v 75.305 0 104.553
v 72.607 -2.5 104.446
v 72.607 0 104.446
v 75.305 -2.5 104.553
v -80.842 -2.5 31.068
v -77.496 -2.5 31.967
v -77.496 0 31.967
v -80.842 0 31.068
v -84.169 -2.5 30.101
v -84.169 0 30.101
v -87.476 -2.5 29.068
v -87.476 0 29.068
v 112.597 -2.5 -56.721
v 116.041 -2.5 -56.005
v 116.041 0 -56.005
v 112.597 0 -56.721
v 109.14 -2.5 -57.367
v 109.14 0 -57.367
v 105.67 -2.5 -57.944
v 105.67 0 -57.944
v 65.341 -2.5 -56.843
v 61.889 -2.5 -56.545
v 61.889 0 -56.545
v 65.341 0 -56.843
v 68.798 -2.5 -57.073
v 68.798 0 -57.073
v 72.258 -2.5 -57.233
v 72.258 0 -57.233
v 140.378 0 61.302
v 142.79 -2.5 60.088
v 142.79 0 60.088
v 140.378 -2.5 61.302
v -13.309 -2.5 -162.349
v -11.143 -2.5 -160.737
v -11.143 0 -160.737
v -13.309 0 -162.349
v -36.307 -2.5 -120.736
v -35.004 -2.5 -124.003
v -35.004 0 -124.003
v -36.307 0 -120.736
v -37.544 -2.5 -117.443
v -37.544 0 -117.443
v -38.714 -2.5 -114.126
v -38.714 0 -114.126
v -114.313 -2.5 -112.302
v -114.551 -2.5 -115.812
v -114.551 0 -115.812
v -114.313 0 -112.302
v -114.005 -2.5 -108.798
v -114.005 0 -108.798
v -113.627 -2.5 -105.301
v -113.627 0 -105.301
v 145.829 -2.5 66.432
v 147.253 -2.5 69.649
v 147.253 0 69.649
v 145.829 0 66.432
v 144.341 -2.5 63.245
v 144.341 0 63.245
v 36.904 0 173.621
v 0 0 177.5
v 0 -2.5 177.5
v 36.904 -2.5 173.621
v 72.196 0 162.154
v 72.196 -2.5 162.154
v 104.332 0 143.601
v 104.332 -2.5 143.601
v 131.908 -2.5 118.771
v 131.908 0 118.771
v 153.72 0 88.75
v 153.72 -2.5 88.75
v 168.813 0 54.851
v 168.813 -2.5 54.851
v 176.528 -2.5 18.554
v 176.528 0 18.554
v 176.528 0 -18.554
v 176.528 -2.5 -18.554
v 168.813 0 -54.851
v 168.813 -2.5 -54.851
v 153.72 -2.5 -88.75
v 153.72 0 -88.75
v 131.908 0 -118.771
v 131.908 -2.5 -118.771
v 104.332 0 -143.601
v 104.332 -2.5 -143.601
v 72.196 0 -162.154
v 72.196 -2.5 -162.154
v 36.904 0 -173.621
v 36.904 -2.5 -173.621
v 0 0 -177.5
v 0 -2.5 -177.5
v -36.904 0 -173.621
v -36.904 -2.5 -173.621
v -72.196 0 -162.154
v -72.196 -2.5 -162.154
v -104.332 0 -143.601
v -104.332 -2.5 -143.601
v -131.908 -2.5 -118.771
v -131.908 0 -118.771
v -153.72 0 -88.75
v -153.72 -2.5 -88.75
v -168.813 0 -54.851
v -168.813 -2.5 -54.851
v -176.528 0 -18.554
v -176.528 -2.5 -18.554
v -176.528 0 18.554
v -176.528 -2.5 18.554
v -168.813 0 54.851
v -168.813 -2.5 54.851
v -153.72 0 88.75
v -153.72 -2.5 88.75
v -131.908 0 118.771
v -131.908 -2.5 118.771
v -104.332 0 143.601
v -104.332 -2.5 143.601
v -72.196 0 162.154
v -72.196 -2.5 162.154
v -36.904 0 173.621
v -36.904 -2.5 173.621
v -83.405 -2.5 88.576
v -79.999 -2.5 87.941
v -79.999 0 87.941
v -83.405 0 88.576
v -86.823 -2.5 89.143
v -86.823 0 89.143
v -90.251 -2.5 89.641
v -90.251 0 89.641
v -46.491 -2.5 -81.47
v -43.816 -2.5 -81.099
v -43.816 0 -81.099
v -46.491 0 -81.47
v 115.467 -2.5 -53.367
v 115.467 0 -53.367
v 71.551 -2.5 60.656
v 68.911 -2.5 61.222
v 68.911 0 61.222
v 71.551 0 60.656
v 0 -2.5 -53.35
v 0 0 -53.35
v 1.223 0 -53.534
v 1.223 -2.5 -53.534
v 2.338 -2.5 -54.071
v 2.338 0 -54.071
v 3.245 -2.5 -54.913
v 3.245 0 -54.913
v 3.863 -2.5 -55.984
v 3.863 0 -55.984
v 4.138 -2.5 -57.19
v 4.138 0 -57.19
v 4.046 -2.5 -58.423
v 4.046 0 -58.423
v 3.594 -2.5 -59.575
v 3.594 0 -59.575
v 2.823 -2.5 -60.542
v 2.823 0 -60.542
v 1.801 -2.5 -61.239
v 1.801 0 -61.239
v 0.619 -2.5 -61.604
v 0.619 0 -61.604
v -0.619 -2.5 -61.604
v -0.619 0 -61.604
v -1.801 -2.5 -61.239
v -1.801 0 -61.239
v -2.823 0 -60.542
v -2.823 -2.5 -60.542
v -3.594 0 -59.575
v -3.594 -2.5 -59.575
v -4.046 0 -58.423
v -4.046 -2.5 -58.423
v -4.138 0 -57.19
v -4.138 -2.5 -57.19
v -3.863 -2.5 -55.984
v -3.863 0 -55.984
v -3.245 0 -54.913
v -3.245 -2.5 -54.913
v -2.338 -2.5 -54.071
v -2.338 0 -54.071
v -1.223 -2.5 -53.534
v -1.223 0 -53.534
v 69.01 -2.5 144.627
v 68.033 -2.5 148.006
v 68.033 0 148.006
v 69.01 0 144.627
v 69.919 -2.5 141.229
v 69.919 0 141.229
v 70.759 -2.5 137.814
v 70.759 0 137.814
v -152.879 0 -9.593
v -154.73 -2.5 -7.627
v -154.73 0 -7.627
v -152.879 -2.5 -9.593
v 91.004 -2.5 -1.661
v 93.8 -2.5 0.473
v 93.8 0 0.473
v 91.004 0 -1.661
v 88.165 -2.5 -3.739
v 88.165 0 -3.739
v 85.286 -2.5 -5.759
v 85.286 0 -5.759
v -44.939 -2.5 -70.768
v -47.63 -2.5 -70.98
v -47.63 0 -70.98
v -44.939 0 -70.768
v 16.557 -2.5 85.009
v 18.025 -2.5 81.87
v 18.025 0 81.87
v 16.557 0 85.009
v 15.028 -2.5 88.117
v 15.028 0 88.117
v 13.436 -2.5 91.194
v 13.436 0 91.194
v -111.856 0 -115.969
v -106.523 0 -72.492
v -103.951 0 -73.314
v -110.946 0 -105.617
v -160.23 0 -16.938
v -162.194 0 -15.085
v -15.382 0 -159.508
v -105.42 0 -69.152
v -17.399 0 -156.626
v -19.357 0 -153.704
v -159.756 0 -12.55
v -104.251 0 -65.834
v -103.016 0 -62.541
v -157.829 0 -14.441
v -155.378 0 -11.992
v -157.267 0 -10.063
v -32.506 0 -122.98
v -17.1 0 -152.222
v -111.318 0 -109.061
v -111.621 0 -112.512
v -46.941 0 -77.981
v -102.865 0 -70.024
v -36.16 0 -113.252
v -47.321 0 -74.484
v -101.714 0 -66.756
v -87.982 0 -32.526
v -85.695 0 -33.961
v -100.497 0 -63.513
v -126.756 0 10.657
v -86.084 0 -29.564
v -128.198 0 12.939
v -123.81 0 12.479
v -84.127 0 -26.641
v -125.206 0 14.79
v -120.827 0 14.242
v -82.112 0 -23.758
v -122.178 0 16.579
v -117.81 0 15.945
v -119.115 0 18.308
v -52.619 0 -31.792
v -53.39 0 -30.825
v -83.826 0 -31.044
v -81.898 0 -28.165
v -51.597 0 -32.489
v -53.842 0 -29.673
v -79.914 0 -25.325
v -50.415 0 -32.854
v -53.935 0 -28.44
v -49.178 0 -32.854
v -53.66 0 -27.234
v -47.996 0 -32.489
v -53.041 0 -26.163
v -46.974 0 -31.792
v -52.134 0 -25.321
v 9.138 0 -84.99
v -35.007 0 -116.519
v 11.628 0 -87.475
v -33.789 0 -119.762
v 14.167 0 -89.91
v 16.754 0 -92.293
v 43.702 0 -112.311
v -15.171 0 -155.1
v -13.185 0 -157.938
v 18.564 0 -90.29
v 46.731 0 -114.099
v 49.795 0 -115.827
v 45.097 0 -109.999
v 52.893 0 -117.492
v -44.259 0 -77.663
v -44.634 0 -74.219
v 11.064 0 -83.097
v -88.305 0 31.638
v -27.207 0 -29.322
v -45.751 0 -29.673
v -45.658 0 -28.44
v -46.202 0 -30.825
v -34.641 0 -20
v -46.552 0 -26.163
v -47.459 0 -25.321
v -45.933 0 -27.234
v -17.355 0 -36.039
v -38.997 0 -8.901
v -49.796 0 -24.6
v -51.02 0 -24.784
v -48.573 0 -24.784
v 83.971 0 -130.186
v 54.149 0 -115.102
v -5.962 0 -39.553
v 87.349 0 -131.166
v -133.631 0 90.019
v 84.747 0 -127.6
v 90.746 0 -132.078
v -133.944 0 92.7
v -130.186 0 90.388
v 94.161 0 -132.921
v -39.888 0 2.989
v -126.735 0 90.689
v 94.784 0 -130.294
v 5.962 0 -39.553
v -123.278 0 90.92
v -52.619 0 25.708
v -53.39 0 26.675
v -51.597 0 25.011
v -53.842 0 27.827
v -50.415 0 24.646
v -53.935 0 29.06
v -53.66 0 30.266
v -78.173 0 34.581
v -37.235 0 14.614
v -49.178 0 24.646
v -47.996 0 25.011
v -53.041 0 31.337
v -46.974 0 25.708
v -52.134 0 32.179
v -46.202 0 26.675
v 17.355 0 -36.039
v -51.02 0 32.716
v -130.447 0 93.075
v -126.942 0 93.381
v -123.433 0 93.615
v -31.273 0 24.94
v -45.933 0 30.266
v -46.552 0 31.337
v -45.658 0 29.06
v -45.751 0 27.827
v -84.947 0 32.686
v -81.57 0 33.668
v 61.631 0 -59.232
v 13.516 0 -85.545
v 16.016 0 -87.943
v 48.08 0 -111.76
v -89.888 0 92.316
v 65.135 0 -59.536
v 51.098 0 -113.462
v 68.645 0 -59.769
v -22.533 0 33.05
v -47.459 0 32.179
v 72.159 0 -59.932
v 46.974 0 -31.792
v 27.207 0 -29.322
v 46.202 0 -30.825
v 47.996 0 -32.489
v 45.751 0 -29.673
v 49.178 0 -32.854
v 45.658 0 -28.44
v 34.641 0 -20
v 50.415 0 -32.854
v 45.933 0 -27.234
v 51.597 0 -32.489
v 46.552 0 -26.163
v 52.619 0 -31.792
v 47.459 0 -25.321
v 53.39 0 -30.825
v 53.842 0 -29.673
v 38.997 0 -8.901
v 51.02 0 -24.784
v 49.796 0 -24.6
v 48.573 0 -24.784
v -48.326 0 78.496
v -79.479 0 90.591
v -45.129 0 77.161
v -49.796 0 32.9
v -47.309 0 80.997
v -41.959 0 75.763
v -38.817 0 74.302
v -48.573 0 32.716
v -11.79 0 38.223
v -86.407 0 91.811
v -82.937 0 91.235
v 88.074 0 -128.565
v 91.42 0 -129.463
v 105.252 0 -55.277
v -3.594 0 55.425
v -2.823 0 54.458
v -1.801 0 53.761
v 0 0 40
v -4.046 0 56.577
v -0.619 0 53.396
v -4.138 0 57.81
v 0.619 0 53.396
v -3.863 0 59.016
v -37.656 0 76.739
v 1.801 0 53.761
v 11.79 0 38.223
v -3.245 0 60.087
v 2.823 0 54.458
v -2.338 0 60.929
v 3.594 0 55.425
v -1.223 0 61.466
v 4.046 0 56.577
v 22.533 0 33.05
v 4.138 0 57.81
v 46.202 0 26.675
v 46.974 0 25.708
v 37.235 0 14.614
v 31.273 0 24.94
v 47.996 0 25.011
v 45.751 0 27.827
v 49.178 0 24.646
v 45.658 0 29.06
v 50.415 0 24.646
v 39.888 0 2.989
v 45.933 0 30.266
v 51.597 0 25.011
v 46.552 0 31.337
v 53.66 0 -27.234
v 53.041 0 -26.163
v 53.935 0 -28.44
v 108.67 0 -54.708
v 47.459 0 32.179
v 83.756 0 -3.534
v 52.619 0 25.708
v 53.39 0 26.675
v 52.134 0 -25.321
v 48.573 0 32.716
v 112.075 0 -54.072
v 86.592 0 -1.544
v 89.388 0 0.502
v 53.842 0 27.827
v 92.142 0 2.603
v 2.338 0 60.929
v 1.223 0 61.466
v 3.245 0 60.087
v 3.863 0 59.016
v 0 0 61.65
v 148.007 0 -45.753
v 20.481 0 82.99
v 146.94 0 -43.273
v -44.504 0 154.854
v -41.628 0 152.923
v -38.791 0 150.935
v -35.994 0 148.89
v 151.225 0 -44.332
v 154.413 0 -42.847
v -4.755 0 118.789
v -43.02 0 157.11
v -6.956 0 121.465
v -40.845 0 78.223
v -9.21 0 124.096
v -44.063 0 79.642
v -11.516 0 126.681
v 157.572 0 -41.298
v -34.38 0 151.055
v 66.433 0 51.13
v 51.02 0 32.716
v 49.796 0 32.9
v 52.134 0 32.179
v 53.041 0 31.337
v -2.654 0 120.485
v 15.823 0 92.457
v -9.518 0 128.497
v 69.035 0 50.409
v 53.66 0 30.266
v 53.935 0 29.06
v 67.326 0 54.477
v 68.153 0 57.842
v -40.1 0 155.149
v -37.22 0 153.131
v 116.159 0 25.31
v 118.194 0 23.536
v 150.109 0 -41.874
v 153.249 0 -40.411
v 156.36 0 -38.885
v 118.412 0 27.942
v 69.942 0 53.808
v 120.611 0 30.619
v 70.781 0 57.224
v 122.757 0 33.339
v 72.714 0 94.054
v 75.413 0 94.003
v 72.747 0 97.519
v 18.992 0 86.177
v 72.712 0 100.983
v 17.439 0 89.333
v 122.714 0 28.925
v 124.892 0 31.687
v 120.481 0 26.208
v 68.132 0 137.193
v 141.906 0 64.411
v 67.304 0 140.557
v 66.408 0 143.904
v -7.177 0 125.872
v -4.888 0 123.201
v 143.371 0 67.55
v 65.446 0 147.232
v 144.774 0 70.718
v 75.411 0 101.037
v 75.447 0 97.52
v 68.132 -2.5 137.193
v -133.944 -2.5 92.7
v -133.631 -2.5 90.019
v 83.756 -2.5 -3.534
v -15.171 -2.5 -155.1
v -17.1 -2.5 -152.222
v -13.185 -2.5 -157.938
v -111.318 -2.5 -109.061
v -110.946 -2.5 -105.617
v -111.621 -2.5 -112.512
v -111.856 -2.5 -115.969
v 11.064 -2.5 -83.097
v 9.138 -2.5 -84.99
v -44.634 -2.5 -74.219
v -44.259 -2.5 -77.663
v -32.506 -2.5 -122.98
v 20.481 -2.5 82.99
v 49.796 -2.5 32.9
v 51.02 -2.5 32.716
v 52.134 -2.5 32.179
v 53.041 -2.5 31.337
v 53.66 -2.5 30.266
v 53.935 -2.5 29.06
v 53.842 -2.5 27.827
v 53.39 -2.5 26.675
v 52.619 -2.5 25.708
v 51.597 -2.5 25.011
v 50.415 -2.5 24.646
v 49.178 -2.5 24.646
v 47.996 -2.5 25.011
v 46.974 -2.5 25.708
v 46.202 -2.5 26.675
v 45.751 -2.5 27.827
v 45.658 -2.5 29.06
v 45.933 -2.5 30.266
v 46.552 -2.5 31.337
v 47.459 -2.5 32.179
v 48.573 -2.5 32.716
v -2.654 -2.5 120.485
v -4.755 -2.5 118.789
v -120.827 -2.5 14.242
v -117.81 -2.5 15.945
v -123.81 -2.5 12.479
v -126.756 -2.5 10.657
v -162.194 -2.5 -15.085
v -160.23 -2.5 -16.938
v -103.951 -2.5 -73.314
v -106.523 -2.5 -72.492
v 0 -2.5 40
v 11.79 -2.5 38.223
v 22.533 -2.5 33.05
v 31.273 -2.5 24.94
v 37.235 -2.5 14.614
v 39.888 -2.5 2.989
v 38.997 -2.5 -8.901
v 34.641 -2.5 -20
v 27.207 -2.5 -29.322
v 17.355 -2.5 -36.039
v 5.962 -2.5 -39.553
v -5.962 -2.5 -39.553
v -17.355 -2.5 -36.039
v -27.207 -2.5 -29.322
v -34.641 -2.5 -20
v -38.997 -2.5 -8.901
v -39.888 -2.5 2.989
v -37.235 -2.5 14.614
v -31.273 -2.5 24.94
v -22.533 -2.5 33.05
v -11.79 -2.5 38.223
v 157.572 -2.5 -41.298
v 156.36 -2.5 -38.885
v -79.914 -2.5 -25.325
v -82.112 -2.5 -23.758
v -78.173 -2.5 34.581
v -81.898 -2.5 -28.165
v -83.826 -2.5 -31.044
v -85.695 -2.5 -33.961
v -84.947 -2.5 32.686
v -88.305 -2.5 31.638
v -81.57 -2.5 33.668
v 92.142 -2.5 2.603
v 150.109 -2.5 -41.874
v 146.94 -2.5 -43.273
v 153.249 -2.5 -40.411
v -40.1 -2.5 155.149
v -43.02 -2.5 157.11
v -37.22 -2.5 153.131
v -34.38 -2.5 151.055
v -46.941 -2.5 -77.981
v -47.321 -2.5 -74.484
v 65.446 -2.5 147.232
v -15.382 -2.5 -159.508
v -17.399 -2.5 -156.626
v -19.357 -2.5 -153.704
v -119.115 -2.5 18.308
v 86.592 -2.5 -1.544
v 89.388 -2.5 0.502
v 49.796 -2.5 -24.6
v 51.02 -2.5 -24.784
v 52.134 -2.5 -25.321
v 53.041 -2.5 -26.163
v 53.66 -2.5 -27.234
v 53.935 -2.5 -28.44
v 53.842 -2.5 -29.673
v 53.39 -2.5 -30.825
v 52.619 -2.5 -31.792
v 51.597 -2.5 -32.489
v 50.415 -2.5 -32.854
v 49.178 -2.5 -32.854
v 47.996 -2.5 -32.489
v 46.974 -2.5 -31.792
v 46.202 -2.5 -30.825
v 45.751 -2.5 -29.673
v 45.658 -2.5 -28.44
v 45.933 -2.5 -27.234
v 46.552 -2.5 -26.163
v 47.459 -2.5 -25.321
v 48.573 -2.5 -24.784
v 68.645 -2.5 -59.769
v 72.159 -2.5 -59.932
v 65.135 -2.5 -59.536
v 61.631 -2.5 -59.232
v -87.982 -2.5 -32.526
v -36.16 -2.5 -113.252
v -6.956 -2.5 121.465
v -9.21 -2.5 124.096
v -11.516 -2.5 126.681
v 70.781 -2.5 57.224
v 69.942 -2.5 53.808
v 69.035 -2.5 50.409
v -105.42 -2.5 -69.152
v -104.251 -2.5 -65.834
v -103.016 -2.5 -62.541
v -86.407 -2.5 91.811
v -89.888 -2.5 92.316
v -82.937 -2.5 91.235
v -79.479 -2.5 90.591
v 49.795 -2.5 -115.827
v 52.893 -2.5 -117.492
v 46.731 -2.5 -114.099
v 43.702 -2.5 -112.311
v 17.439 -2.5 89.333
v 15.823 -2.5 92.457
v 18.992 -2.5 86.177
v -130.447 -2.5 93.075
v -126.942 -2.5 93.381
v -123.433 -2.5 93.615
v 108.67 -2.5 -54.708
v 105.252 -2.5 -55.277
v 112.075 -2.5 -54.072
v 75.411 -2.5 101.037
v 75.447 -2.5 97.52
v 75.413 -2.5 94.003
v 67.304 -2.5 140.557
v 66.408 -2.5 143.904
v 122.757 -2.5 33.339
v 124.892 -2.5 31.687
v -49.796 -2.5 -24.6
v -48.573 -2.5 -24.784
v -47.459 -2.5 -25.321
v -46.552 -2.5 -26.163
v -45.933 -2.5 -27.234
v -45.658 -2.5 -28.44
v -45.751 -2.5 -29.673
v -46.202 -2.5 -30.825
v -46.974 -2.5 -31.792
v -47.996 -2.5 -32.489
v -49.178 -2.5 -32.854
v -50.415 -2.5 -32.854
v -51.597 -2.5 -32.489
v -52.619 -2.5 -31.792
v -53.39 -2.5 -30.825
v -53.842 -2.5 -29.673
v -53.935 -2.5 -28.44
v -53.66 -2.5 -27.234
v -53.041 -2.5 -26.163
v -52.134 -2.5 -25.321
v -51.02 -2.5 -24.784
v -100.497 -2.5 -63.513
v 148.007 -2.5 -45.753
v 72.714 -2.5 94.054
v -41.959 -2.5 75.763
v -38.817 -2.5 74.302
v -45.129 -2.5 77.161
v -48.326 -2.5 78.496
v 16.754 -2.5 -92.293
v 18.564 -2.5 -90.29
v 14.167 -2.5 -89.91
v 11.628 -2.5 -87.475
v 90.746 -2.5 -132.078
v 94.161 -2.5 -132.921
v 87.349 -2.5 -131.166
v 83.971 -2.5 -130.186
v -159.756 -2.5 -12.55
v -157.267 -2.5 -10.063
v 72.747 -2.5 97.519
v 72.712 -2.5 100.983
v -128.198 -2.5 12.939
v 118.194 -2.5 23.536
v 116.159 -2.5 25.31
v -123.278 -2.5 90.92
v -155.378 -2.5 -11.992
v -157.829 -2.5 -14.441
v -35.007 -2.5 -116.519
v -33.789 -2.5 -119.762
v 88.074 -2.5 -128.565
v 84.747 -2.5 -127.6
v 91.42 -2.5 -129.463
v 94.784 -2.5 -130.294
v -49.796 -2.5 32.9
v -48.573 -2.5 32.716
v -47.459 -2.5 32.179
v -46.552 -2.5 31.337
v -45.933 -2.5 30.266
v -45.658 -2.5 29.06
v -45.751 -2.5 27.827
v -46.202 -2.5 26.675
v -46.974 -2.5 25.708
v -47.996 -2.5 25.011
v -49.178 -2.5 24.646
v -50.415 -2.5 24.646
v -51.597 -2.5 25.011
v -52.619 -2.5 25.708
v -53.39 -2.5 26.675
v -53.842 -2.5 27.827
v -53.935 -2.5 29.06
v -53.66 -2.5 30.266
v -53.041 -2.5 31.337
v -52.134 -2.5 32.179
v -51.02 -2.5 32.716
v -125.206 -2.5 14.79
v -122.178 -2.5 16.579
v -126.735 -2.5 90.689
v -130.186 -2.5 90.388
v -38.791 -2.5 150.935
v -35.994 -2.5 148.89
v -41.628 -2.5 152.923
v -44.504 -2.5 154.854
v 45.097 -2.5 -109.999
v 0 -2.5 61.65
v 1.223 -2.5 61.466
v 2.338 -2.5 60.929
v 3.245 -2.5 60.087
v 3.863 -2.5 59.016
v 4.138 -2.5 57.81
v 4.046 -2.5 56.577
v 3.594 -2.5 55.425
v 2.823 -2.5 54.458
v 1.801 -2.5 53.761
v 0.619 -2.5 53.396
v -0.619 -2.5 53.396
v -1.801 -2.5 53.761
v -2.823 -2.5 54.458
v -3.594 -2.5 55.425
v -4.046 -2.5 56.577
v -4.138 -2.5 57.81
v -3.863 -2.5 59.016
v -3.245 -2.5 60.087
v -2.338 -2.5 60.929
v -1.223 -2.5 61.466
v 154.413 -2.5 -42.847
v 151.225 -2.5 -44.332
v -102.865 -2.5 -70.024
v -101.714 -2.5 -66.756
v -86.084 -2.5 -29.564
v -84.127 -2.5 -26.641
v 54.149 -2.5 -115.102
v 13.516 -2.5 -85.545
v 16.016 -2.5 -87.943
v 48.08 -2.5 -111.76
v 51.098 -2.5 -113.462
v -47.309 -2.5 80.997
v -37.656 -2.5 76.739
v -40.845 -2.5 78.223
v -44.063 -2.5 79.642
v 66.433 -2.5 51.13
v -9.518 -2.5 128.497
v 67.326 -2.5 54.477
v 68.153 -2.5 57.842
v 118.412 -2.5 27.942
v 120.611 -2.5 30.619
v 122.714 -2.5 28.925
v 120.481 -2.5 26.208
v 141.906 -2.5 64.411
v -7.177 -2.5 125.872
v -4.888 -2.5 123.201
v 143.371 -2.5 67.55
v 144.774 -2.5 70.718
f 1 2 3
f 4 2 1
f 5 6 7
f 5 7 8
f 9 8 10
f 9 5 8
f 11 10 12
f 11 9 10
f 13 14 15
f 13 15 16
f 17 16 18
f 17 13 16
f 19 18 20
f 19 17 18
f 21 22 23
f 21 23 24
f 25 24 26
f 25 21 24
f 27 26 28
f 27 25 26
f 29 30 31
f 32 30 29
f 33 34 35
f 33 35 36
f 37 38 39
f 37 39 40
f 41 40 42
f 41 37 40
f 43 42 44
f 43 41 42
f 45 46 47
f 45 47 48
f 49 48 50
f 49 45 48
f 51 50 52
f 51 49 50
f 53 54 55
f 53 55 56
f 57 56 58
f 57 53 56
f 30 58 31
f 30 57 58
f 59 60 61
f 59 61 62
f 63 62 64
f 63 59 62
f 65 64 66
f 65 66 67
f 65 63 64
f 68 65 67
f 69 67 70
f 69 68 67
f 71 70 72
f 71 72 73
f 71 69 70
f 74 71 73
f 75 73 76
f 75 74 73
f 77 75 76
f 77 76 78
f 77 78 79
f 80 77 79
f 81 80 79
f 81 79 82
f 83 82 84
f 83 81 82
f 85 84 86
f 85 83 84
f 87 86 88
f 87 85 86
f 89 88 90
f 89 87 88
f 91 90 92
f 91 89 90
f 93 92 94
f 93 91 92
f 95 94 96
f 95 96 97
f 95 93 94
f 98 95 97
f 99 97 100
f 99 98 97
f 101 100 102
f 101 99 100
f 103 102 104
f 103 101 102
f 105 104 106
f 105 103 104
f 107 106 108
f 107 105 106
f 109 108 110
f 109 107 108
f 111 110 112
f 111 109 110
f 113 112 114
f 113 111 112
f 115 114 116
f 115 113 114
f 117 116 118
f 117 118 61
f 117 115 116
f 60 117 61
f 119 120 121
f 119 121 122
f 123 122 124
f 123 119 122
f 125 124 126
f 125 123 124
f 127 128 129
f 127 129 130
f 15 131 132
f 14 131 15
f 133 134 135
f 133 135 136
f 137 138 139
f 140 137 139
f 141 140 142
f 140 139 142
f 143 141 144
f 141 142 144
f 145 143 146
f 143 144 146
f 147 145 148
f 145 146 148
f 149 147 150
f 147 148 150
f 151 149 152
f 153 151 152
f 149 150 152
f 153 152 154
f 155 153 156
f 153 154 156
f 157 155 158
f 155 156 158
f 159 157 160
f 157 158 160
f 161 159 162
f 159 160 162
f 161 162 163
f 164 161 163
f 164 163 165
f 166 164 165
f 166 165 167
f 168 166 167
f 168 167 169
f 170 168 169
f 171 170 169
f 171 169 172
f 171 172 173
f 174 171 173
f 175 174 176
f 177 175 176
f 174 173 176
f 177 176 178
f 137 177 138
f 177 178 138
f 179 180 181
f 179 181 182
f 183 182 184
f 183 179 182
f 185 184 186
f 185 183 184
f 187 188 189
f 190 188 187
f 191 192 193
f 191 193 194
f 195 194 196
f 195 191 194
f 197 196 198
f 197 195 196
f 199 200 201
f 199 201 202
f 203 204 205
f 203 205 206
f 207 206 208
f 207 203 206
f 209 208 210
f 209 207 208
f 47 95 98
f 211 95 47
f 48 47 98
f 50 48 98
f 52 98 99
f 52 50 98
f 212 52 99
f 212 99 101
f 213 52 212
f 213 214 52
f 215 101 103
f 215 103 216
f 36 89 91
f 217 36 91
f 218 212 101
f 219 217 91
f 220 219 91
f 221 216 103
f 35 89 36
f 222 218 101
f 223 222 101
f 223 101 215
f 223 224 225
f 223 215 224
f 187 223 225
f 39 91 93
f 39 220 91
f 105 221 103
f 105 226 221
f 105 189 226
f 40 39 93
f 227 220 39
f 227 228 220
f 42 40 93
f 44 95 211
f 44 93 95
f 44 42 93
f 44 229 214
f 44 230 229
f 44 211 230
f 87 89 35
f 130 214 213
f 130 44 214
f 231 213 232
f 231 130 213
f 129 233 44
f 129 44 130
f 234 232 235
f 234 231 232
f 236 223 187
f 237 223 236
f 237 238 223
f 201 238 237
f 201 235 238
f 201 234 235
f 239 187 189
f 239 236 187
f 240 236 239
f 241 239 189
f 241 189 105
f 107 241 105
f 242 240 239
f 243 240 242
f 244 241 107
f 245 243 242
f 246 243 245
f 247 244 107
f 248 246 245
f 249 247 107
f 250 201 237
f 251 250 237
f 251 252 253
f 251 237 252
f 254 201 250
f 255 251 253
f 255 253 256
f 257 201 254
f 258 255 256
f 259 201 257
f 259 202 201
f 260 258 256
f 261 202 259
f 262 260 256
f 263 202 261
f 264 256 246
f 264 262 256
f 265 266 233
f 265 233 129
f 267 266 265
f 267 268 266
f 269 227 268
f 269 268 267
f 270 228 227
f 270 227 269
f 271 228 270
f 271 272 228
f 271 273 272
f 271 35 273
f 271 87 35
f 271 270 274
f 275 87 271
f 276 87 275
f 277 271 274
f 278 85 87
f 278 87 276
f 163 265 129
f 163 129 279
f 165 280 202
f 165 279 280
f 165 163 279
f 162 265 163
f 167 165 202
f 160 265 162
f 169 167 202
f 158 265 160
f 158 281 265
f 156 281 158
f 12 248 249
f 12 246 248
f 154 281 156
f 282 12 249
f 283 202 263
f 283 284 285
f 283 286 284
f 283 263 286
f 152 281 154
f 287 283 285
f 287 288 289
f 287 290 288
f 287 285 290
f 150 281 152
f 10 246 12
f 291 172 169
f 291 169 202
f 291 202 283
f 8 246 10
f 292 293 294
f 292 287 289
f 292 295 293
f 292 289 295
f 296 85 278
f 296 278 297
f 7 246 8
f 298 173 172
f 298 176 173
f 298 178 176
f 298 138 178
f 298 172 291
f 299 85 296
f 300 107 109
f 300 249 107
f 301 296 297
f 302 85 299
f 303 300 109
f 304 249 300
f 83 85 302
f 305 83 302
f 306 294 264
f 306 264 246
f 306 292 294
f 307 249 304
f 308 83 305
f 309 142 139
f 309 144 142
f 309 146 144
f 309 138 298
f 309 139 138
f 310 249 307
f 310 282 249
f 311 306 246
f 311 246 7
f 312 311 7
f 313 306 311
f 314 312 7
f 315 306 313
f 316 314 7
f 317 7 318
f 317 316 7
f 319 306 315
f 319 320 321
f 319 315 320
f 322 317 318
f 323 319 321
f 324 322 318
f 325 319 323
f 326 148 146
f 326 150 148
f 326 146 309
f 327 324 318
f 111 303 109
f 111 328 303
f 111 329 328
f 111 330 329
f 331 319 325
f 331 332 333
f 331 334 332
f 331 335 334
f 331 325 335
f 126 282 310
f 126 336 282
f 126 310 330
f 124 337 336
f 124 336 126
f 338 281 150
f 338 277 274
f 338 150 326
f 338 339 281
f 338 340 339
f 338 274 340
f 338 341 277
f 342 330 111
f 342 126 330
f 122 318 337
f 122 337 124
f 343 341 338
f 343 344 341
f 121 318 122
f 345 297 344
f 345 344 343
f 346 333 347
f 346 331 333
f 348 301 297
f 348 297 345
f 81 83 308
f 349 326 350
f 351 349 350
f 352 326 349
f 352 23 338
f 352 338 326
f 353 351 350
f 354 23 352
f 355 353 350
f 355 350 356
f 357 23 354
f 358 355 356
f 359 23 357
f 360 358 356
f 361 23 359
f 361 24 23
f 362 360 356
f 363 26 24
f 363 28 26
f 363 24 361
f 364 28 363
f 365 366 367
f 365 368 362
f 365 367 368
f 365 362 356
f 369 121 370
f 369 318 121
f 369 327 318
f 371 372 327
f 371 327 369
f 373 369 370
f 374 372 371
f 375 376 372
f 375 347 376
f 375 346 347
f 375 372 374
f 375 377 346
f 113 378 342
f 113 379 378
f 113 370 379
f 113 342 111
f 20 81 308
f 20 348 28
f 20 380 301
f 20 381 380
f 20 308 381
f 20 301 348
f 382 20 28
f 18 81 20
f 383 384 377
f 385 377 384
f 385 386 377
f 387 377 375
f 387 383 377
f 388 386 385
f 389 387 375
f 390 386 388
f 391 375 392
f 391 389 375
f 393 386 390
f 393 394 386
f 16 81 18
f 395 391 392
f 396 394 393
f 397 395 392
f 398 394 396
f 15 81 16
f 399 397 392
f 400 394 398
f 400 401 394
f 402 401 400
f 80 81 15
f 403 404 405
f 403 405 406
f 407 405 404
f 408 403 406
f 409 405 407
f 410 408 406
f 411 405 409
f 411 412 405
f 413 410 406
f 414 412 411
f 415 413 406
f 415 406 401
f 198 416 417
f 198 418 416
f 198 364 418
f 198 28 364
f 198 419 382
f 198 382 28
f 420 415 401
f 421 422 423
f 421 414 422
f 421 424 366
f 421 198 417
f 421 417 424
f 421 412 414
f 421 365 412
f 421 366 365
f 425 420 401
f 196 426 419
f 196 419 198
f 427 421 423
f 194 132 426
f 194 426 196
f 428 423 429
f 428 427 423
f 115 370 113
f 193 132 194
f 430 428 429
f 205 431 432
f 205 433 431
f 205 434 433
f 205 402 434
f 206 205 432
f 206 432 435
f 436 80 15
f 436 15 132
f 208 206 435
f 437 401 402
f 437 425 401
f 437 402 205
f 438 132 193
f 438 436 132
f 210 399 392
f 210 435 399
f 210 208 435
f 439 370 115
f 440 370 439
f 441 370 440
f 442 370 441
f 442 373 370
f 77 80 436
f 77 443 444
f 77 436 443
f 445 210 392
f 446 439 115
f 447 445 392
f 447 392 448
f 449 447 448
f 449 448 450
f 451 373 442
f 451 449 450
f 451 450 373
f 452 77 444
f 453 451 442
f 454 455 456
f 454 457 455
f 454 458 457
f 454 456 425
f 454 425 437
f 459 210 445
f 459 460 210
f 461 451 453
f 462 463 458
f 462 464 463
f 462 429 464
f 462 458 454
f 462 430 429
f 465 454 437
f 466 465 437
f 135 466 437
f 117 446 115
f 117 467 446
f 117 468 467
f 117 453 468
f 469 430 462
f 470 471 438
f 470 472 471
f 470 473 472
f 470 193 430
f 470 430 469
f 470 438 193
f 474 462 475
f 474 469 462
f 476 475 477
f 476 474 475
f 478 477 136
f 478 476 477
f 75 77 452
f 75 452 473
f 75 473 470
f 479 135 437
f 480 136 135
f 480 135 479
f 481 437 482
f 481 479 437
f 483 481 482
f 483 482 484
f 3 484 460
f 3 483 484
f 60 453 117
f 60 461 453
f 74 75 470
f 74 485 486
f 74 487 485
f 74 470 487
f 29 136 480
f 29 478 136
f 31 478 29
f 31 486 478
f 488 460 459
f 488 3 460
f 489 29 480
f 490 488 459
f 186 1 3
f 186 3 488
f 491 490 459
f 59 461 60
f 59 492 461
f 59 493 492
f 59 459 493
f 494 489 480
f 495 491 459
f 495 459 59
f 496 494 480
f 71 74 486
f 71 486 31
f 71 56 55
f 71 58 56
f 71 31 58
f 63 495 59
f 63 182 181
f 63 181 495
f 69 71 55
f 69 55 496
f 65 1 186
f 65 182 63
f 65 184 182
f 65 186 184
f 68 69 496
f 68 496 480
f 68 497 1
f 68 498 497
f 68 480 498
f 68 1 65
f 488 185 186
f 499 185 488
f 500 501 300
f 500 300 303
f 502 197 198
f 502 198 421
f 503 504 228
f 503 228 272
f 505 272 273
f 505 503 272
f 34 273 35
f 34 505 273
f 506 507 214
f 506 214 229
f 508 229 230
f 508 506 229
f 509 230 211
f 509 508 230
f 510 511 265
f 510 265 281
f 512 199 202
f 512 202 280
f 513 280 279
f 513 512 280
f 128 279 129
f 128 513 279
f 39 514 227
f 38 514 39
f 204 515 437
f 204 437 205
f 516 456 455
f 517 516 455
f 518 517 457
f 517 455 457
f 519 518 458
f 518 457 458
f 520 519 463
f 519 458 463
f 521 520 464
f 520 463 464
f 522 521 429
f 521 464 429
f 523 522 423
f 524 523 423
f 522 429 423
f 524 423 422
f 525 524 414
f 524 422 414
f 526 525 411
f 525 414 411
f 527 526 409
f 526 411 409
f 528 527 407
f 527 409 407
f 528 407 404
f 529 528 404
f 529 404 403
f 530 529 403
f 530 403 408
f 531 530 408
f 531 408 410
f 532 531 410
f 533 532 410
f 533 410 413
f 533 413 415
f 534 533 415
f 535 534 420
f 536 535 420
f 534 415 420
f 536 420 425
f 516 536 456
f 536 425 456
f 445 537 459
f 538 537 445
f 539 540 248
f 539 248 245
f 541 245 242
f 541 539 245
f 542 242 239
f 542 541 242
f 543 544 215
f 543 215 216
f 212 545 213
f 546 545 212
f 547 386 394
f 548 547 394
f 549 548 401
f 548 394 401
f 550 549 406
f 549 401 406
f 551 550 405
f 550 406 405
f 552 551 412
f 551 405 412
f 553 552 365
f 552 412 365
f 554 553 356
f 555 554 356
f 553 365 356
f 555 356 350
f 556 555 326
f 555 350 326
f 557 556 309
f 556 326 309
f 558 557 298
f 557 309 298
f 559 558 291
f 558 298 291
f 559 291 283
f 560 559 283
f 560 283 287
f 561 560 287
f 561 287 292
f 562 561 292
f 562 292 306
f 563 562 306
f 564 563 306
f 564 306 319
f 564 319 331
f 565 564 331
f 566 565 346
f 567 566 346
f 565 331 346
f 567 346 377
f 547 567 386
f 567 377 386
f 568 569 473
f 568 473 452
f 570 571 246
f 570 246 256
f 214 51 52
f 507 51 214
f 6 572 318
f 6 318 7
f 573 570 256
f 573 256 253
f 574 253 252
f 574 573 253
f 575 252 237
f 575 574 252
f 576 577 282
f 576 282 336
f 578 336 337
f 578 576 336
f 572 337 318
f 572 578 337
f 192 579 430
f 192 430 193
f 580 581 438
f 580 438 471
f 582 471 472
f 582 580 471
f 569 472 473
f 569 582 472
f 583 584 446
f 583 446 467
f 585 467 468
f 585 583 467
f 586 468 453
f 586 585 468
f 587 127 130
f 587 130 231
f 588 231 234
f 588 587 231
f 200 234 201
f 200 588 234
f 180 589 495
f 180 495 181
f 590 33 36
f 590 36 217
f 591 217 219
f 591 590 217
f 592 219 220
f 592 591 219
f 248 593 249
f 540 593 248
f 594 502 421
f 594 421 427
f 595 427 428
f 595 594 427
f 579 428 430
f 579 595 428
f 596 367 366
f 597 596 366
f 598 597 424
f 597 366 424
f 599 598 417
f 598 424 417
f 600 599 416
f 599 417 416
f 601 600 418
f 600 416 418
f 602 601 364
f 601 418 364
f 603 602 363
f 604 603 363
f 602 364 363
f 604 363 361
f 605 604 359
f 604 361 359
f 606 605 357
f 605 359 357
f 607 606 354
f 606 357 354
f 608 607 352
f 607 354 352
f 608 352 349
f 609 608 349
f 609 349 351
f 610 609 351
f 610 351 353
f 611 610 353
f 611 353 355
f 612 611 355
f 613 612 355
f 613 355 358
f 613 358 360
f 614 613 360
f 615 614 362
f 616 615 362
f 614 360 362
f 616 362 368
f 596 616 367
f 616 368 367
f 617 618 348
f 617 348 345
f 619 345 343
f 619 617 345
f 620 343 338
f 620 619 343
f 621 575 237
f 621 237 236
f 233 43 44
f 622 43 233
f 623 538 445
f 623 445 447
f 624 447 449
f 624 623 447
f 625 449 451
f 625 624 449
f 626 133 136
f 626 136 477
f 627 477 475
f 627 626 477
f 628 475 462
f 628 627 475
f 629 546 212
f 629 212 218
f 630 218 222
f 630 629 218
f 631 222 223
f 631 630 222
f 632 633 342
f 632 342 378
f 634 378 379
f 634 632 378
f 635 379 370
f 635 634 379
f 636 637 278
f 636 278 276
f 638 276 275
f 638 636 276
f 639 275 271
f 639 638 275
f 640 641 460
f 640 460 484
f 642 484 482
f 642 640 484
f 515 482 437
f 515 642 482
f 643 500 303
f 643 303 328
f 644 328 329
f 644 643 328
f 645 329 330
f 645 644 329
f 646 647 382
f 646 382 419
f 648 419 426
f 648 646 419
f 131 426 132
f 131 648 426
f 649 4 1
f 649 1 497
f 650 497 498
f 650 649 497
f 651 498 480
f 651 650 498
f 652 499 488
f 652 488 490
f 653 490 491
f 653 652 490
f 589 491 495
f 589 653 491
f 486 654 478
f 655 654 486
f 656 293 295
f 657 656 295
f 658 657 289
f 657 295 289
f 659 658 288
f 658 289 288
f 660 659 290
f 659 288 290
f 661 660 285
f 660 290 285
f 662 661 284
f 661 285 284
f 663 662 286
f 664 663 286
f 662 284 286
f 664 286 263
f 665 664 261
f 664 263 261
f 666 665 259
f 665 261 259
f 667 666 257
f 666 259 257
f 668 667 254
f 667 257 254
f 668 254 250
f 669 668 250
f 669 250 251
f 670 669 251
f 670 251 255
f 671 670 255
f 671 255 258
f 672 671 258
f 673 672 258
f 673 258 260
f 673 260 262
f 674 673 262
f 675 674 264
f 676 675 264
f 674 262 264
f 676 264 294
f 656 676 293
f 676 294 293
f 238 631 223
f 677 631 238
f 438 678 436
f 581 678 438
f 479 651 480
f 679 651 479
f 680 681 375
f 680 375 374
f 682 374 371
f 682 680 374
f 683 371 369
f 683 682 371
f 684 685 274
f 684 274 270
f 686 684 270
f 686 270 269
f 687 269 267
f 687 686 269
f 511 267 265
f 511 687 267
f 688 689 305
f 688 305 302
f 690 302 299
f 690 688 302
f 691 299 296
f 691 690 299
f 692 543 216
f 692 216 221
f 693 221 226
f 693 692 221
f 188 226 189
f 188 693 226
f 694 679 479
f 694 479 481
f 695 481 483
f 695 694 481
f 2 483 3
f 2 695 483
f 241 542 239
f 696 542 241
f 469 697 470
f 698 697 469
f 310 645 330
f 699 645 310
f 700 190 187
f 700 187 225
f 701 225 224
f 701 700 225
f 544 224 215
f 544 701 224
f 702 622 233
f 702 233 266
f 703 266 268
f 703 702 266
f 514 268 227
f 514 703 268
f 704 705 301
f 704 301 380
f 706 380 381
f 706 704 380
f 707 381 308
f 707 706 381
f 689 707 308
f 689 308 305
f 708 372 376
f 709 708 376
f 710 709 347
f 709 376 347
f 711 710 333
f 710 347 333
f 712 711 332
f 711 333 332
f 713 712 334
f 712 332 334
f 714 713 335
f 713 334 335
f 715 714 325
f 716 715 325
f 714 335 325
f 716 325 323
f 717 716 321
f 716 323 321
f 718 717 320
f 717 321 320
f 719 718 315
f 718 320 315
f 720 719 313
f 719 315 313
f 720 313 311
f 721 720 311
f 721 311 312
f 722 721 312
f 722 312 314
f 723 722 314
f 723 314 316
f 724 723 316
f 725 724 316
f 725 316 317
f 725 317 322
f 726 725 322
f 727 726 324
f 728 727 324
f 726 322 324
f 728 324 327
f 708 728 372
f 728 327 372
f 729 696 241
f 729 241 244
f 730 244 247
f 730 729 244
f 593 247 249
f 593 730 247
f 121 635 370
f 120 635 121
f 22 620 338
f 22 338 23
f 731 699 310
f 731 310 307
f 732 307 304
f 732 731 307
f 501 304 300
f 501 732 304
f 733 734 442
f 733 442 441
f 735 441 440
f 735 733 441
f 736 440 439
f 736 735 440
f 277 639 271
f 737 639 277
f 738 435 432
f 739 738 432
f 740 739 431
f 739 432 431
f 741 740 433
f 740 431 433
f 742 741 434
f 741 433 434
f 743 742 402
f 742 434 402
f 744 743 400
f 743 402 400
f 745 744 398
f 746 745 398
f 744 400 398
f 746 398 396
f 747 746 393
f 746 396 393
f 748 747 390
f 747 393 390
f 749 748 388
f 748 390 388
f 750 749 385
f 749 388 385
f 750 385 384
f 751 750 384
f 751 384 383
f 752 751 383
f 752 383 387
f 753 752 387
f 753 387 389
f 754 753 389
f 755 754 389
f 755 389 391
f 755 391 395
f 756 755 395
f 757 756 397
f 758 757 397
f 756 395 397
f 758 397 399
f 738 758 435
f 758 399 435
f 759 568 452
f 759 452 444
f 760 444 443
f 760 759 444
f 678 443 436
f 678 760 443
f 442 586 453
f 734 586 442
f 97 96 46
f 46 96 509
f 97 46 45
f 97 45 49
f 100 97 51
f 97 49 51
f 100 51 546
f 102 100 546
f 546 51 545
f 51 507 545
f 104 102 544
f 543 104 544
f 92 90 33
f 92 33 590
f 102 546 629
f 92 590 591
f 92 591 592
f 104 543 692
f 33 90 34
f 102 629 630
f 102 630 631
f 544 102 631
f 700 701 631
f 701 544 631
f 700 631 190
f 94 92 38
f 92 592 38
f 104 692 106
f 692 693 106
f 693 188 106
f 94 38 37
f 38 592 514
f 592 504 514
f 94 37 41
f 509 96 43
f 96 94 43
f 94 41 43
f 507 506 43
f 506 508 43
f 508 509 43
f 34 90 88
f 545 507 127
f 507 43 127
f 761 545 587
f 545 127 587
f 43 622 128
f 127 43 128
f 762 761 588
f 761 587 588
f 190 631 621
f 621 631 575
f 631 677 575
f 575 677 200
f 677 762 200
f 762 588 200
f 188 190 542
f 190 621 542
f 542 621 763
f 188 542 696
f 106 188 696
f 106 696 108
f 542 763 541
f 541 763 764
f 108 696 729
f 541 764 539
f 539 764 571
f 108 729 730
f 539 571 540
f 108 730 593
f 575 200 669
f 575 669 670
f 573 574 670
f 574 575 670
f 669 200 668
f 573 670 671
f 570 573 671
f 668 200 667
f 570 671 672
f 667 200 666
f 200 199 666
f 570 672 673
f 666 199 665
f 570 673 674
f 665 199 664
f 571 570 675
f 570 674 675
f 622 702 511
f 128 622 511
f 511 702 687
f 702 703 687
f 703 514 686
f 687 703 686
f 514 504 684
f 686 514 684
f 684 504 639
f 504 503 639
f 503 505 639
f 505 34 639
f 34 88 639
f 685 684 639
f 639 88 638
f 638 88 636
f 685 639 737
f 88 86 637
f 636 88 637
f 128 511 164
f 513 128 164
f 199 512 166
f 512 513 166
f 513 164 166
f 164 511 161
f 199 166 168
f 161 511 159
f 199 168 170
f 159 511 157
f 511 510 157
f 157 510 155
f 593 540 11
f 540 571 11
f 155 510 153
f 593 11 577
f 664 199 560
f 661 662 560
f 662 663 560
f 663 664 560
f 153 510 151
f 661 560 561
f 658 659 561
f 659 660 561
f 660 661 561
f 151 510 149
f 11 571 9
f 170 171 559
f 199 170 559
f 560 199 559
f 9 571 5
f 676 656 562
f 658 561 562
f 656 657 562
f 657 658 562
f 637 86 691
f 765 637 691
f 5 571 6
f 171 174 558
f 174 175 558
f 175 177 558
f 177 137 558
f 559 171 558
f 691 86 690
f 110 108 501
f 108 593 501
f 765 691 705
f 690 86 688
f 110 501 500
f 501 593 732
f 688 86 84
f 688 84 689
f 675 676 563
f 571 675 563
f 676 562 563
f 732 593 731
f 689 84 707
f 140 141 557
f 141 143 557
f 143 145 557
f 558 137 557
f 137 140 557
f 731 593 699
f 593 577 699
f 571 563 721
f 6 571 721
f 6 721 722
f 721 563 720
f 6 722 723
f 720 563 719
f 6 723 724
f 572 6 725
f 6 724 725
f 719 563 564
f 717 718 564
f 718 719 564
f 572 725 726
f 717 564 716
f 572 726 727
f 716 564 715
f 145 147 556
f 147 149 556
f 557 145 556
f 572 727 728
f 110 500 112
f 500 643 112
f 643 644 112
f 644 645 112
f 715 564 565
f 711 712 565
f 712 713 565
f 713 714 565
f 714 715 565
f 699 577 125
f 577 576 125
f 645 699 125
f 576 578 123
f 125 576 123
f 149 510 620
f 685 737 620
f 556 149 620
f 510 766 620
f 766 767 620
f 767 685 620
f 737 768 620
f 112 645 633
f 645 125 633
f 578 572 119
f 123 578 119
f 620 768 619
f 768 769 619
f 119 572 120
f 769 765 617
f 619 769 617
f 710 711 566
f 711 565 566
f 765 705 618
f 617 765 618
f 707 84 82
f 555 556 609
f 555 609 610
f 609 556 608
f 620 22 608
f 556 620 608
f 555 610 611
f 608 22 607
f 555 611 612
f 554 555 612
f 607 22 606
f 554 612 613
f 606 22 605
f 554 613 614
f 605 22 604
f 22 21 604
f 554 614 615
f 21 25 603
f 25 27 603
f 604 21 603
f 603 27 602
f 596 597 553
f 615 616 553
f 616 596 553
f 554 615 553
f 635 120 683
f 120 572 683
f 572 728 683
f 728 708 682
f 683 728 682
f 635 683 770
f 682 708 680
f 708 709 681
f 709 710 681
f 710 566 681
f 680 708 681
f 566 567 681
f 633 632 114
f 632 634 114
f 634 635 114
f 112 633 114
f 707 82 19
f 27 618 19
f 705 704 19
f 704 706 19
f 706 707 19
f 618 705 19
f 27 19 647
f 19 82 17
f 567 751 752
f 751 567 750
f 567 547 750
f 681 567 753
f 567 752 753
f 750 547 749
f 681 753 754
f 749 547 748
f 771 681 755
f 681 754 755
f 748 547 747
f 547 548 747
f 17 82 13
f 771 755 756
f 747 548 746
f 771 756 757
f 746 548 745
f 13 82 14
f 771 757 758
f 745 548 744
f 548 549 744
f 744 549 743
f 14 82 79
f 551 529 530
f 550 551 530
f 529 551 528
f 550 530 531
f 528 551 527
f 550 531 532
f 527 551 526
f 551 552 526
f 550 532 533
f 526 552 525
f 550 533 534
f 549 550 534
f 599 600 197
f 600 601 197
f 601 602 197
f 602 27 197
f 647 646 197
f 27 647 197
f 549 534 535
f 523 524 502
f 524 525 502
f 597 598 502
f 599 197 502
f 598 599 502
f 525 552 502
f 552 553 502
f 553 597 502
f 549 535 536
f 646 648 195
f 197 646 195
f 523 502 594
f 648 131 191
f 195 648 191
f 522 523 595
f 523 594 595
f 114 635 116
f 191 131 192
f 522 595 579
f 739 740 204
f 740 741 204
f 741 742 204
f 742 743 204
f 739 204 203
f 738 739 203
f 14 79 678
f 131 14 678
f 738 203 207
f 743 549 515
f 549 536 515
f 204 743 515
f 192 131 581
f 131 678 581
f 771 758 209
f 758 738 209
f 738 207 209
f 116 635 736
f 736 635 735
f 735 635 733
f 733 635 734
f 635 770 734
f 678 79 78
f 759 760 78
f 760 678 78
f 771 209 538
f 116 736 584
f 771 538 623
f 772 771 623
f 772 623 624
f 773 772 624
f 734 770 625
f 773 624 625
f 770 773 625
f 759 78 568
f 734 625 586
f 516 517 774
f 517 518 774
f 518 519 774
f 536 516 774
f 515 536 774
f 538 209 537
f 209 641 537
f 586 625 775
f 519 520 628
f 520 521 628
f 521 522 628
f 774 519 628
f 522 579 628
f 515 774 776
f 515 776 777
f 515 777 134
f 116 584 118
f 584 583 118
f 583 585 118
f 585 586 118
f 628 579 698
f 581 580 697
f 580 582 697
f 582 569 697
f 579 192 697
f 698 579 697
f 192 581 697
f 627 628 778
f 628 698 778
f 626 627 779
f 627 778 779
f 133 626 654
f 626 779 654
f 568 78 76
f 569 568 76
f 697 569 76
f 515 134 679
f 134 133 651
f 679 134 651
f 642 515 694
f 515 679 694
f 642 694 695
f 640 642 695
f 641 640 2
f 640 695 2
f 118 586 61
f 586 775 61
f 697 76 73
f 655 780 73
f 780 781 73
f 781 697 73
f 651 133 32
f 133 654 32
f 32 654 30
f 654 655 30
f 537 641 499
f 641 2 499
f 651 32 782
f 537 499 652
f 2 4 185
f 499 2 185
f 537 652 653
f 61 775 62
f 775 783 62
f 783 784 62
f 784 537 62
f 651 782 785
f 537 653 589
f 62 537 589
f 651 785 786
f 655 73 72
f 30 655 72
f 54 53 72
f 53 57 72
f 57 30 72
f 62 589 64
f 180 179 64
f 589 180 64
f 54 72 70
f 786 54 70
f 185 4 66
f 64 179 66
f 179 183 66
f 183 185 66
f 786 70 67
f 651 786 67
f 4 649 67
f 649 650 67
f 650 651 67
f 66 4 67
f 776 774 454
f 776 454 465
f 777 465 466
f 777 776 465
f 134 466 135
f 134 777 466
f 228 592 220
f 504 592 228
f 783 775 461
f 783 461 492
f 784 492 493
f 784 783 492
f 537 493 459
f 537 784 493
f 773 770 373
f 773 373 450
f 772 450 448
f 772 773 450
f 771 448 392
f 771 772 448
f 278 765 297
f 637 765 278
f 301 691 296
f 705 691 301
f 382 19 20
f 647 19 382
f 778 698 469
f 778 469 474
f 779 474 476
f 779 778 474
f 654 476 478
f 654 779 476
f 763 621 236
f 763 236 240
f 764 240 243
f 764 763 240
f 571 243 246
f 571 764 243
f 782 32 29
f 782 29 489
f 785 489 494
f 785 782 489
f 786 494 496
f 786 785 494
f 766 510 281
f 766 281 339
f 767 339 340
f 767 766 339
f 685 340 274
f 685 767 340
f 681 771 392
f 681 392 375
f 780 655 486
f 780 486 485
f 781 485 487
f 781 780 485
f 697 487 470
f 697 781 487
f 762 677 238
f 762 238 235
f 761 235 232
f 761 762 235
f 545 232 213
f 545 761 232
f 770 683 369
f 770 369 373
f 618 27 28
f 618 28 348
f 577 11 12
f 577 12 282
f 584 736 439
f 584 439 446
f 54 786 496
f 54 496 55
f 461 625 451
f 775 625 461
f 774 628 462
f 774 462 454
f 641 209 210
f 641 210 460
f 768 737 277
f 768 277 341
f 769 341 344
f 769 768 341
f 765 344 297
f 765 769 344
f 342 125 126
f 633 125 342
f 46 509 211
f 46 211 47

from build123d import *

# Parameters (mm, degrees)
SKETCH2_R                = 177.5
SKETCH2_R_2              = 40
SKETCH2_R_3              = 4.15
BASE_FLANGE1_DEPTH       = 2.5
TAB_START                = -2.5
TAB_AND_SLOT_SLOT1_DEPTH = 2.5
CIRPATTERN1_COUNT        = 9


# Read off the part's stored shape, not the designer's step: Tab and Slot-Slot1
# Sheet-metal steps are written as plain solids
with BuildPart() as part:
    # Sketch2 → Base-Flange1 (new body)
    with BuildSketch(Plane(origin=(0, 0, 0), x_dir=(1, 0, 0), z_dir=(0, 1, 0))):
        with Locations(Location((0, 0, 0), (0, 0, 270))):
            Circle(SKETCH2_R)
        with Locations(Location((0, 0, 0), (0, 0, 270))):
            Circle(SKETCH2_R_2, mode=Mode.SUBTRACT)
        with Locations(Location((0, 57.5, 0), (0, 0, 270))):
            Circle(SKETCH2_R_3, mode=Mode.SUBTRACT)
        with Locations(Location((49.796460718, 28.75, 0), (0, 0, 270))):
            Circle(SKETCH2_R_3, mode=Mode.SUBTRACT)
        with Locations(Location((49.796460718, -28.75, 0), (0, 0, 270))):
            Circle(SKETCH2_R_3, mode=Mode.SUBTRACT)
        with Locations(Location((0, -57.5, 0), (0, 0, 270))):
            Circle(SKETCH2_R_3, mode=Mode.SUBTRACT)
        with Locations(Location((-49.796460718, -28.75, 0), (0, 0, 270))):
            Circle(SKETCH2_R_3, mode=Mode.SUBTRACT)
        with Locations(Location((-49.796460718, 28.75, 0), (0, 0, 270))):
            Circle(SKETCH2_R_3, mode=Mode.SUBTRACT)
    extrude(amount=-BASE_FLANGE1_DEPTH)

    # Tab and Slot-Slot1 outline → Tab and Slot-Slot1 (cut)
    with BuildSketch(Plane(origin=(0, 0, 0), x_dir=(1, 0, 0), z_dir=(0, 1, 0)).offset(TAB_START)):
        with BuildLine():
            Line((-19.35698036, 153.703677576), (-17.100043029, 152.221707173))
            ThreePointArc((-17.100043029, 152.221707173), (-14.185380107, 156.523975279), (-11.142966591, 160.736871053))
            Line((-11.142966591, 160.736871053), (-13.308830451, 162.349023691))
            ThreePointArc((-13.308830451, 162.349023691), (-16.397738089, 158.071706572), (-19.35698036, 153.703677576))
        make_face()
        with BuildLine():
            ThreePointArc((-36.160055897, 113.251731275), (-34.405862702, 118.143313538), (-32.505717981, 122.980070804))
            Line((-32.505717981, 122.980070804), (-35.004247803, 124.003472544))
            ThreePointArc((-35.004247803, 124.003472544), (-36.933420587, 119.092761343), (-38.714454271, 114.126403408))
            Line((-38.714454271, 114.126403408), (-36.160055897, 113.251731275))
        make_face()
        with BuildLine():
            ThreePointArc((-44.938772946, 70.767884474), (-44.45508819, 75.941937031), (-43.816406366, 81.09915104))
            Line((-43.816406366, 81.09915104), (-46.490871974, 81.469604956))
            ThreePointArc((-46.490871974, 81.469604956), (-47.139294904, 76.233543475), (-47.630397611, 70.980391064))
            Line((-47.630397611, 70.980391064), (-44.938772946, 70.767884474))
        make_face()
    tab_and_slot_slot1 = extrude(amount=TAB_AND_SLOT_SLOT1_DEPTH, mode=Mode.SUBTRACT)

    # CirPattern1: Tab and Slot-Slot1 ×9 about axis
    cirpattern1_axis = Axis((0, 0, 0), (0, 1, 0))
    for i in range(1, CIRPATTERN1_COUNT):
        add(tab_and_slot_slot1.rotate(cirpattern1_axis, i * 360 / CIRPATTERN1_COUNT), mode=Mode.SUBTRACT)


solid = part.part
